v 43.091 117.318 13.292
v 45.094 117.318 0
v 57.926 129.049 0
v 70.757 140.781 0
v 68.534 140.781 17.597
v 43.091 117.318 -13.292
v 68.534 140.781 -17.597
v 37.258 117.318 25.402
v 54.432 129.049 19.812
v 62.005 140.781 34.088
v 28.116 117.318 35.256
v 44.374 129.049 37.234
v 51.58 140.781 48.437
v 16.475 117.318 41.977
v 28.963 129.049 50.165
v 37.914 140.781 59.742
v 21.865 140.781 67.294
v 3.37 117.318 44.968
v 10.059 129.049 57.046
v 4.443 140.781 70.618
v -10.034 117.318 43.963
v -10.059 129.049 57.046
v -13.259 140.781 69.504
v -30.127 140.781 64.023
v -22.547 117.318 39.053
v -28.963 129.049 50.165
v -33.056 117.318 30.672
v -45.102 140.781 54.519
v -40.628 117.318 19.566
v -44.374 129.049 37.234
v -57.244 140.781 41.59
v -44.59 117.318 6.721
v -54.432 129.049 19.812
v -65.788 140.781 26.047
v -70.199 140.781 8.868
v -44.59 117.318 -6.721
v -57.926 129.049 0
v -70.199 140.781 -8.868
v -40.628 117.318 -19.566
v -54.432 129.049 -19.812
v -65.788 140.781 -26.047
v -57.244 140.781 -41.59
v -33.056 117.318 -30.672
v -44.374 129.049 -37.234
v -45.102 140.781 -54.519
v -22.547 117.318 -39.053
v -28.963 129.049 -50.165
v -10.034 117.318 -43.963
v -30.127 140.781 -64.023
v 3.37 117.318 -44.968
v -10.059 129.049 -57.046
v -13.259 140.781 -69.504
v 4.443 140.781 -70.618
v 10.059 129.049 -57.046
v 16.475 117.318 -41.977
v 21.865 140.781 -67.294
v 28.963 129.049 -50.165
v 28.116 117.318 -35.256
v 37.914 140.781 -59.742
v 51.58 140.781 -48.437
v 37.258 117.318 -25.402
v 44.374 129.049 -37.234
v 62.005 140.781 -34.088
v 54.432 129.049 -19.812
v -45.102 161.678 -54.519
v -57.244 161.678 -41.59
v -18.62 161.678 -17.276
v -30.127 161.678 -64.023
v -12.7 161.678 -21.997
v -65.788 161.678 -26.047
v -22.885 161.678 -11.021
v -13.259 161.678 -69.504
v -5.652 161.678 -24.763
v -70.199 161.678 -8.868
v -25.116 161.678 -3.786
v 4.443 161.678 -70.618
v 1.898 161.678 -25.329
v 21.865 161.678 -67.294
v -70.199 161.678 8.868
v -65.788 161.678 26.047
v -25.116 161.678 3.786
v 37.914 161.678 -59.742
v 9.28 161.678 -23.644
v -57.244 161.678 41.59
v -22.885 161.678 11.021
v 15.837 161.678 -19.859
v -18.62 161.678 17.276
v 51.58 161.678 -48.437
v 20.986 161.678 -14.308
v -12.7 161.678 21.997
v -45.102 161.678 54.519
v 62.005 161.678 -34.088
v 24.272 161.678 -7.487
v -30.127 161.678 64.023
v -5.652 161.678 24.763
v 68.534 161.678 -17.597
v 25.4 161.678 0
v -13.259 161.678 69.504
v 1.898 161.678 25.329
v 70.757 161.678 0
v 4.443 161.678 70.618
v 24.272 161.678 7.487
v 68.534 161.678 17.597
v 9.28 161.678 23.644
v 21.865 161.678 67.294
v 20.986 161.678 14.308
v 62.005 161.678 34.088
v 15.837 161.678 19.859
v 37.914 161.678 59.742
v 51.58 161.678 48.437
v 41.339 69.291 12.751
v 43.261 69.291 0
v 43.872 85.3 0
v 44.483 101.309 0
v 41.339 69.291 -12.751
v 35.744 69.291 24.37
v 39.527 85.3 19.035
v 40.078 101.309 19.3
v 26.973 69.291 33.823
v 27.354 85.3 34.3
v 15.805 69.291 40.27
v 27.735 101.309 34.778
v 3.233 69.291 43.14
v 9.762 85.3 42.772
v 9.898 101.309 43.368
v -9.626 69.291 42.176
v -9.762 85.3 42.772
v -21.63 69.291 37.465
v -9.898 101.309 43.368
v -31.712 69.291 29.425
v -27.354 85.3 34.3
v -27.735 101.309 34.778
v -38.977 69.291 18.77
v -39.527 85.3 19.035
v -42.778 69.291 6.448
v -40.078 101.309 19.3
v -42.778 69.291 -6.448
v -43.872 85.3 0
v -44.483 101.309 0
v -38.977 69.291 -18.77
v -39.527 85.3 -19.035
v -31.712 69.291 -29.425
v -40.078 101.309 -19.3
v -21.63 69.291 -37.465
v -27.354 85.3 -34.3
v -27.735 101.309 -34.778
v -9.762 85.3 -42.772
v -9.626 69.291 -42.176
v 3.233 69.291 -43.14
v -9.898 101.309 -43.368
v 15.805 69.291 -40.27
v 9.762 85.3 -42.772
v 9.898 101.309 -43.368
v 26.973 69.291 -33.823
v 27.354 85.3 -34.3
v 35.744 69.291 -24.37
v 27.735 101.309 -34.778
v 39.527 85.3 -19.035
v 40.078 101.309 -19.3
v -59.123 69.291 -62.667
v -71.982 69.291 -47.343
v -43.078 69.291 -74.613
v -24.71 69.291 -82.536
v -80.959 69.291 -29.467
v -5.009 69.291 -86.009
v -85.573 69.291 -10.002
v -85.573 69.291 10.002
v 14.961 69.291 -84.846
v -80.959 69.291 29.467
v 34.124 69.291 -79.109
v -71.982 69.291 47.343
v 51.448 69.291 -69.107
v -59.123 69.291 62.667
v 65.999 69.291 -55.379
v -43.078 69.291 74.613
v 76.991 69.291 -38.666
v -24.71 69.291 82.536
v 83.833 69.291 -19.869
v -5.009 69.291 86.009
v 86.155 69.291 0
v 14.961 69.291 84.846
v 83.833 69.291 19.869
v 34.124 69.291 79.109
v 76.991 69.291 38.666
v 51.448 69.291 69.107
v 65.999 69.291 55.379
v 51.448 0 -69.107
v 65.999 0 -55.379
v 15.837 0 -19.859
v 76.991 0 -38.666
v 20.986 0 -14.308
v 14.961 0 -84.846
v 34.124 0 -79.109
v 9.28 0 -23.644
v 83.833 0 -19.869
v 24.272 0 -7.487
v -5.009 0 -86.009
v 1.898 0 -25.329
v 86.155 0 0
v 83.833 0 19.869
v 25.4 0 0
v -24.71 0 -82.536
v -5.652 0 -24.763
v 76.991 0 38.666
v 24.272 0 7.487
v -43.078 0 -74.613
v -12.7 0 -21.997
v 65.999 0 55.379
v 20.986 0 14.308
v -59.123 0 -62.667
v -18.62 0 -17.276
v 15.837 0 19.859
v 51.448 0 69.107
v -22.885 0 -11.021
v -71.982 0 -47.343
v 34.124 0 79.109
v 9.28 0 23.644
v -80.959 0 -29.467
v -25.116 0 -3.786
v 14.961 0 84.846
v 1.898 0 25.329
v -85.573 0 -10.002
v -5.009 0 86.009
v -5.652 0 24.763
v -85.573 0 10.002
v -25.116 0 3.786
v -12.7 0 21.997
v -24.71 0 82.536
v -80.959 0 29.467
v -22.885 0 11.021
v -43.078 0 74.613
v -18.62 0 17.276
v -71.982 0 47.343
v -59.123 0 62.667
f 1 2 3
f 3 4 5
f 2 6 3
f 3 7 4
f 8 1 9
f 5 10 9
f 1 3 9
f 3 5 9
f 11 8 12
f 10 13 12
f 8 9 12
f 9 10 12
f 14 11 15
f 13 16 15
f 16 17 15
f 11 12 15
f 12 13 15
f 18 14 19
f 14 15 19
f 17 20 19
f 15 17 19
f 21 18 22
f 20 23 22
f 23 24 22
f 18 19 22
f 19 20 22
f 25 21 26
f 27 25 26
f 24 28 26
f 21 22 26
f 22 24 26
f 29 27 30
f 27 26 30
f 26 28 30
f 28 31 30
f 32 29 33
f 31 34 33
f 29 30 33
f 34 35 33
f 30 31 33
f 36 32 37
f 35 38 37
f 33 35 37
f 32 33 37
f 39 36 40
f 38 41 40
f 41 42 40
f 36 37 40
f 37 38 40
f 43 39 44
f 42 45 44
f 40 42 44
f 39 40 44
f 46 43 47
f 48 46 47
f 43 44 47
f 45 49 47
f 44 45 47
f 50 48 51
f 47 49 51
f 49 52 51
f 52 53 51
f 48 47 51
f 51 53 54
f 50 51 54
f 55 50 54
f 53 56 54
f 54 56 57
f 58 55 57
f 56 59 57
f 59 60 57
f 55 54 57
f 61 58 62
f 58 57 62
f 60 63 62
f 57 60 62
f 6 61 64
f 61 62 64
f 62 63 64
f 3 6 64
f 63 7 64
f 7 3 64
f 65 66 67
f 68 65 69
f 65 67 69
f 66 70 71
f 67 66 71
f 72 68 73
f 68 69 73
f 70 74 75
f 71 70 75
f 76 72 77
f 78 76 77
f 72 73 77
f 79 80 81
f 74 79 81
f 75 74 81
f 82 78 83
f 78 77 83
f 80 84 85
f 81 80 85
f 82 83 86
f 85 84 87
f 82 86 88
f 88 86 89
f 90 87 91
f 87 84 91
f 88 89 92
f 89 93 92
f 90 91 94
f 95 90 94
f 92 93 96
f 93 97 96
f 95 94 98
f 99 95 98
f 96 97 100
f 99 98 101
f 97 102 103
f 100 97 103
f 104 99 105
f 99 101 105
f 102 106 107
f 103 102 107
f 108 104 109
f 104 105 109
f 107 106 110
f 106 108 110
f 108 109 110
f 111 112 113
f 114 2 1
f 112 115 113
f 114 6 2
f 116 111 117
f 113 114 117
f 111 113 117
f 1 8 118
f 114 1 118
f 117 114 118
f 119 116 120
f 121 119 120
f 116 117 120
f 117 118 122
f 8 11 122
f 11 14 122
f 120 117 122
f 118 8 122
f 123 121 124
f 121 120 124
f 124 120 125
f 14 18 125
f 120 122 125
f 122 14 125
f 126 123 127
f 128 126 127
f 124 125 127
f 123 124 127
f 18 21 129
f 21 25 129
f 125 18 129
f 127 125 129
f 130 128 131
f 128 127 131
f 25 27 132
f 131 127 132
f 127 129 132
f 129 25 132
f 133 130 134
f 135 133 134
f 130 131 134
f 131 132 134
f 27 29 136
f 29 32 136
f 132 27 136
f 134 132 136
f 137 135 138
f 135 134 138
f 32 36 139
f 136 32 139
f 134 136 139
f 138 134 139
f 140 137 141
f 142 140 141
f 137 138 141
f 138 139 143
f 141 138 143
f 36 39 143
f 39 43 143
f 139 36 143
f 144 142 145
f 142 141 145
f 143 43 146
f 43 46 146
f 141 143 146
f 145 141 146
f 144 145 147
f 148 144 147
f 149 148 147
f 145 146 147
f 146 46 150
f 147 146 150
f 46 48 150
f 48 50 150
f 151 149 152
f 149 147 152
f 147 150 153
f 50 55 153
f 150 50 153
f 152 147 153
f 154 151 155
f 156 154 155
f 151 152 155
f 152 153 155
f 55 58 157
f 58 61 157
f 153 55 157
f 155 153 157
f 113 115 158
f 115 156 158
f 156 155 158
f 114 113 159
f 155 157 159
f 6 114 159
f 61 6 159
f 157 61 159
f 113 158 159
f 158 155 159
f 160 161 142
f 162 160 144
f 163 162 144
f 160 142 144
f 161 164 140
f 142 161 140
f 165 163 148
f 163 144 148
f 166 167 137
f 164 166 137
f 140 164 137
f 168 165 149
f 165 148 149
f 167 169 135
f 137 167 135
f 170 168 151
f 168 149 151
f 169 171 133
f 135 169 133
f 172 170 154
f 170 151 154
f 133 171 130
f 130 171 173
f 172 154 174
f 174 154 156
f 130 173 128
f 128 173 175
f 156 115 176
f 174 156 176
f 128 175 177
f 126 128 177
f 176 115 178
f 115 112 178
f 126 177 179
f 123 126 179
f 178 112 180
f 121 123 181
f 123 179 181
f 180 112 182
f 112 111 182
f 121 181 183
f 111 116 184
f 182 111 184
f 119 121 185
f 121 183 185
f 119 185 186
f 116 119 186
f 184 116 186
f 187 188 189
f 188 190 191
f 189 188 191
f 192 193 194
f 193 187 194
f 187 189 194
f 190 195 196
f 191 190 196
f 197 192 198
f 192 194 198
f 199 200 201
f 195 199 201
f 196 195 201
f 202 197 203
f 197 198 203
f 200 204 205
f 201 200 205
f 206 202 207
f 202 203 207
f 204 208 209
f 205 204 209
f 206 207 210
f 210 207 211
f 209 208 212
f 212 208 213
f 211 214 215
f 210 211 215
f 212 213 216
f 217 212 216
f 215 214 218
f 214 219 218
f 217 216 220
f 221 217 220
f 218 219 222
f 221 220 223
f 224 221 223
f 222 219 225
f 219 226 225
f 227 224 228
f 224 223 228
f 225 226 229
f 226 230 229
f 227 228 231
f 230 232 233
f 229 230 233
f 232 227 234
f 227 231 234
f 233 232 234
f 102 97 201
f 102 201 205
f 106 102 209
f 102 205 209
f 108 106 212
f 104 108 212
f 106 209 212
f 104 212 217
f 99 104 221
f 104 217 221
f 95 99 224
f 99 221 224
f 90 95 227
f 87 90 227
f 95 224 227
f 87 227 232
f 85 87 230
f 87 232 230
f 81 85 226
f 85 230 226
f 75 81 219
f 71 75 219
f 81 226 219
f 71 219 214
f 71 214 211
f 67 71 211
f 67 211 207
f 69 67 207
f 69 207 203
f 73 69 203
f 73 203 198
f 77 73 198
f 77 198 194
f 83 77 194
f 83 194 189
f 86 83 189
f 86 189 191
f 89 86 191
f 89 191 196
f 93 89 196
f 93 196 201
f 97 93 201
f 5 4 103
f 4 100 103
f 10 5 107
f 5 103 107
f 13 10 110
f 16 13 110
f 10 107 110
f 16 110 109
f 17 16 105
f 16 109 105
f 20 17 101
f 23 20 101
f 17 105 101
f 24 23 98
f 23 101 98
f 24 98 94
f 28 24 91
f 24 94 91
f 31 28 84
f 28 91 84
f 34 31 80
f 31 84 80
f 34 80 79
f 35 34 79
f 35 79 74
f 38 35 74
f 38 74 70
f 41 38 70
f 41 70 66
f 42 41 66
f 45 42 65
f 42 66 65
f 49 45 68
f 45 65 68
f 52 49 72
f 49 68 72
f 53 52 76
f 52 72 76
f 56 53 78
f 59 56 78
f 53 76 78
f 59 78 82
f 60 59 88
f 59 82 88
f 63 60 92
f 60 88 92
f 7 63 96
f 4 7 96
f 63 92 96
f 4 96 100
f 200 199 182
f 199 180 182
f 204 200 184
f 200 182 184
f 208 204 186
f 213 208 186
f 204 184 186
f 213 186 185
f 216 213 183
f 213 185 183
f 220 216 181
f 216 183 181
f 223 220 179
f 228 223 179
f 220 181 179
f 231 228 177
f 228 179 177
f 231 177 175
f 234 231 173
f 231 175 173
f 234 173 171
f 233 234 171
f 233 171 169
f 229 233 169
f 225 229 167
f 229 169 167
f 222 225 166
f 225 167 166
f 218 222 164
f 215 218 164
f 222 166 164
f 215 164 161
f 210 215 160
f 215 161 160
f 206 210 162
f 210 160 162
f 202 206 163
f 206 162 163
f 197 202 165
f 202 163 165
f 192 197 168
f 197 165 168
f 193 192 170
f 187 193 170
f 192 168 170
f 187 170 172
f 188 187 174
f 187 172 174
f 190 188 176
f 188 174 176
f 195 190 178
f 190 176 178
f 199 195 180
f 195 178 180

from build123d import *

# Parameters (mm, degrees)
F3_D = 50.8


with BuildPart() as f1:
    # F0 (on Top) → F1 (revolve)
    with BuildSketch(Plane.XY):
        Polygon((0, 161.678255), (0, 0), (86.155102, 0), (86.155102, 69.290683), (43.260872, 69.290683), (45.093954, 117.317565), (70.757166, 140.781075), (70.757166, 161.678255), align=None)
    revolve(axis=Axis((0, 80.839127, 0), (0, -1, 0)))

    # F3 (through all)
    with Locations(Plane(origin=(0, 161.678255, 0), x_dir=(-1, 0, 0), z_dir=(0, 1, 0))):
        with Locations((0, 0)):
            Hole(F3_D / 2)


solid = f1.part
